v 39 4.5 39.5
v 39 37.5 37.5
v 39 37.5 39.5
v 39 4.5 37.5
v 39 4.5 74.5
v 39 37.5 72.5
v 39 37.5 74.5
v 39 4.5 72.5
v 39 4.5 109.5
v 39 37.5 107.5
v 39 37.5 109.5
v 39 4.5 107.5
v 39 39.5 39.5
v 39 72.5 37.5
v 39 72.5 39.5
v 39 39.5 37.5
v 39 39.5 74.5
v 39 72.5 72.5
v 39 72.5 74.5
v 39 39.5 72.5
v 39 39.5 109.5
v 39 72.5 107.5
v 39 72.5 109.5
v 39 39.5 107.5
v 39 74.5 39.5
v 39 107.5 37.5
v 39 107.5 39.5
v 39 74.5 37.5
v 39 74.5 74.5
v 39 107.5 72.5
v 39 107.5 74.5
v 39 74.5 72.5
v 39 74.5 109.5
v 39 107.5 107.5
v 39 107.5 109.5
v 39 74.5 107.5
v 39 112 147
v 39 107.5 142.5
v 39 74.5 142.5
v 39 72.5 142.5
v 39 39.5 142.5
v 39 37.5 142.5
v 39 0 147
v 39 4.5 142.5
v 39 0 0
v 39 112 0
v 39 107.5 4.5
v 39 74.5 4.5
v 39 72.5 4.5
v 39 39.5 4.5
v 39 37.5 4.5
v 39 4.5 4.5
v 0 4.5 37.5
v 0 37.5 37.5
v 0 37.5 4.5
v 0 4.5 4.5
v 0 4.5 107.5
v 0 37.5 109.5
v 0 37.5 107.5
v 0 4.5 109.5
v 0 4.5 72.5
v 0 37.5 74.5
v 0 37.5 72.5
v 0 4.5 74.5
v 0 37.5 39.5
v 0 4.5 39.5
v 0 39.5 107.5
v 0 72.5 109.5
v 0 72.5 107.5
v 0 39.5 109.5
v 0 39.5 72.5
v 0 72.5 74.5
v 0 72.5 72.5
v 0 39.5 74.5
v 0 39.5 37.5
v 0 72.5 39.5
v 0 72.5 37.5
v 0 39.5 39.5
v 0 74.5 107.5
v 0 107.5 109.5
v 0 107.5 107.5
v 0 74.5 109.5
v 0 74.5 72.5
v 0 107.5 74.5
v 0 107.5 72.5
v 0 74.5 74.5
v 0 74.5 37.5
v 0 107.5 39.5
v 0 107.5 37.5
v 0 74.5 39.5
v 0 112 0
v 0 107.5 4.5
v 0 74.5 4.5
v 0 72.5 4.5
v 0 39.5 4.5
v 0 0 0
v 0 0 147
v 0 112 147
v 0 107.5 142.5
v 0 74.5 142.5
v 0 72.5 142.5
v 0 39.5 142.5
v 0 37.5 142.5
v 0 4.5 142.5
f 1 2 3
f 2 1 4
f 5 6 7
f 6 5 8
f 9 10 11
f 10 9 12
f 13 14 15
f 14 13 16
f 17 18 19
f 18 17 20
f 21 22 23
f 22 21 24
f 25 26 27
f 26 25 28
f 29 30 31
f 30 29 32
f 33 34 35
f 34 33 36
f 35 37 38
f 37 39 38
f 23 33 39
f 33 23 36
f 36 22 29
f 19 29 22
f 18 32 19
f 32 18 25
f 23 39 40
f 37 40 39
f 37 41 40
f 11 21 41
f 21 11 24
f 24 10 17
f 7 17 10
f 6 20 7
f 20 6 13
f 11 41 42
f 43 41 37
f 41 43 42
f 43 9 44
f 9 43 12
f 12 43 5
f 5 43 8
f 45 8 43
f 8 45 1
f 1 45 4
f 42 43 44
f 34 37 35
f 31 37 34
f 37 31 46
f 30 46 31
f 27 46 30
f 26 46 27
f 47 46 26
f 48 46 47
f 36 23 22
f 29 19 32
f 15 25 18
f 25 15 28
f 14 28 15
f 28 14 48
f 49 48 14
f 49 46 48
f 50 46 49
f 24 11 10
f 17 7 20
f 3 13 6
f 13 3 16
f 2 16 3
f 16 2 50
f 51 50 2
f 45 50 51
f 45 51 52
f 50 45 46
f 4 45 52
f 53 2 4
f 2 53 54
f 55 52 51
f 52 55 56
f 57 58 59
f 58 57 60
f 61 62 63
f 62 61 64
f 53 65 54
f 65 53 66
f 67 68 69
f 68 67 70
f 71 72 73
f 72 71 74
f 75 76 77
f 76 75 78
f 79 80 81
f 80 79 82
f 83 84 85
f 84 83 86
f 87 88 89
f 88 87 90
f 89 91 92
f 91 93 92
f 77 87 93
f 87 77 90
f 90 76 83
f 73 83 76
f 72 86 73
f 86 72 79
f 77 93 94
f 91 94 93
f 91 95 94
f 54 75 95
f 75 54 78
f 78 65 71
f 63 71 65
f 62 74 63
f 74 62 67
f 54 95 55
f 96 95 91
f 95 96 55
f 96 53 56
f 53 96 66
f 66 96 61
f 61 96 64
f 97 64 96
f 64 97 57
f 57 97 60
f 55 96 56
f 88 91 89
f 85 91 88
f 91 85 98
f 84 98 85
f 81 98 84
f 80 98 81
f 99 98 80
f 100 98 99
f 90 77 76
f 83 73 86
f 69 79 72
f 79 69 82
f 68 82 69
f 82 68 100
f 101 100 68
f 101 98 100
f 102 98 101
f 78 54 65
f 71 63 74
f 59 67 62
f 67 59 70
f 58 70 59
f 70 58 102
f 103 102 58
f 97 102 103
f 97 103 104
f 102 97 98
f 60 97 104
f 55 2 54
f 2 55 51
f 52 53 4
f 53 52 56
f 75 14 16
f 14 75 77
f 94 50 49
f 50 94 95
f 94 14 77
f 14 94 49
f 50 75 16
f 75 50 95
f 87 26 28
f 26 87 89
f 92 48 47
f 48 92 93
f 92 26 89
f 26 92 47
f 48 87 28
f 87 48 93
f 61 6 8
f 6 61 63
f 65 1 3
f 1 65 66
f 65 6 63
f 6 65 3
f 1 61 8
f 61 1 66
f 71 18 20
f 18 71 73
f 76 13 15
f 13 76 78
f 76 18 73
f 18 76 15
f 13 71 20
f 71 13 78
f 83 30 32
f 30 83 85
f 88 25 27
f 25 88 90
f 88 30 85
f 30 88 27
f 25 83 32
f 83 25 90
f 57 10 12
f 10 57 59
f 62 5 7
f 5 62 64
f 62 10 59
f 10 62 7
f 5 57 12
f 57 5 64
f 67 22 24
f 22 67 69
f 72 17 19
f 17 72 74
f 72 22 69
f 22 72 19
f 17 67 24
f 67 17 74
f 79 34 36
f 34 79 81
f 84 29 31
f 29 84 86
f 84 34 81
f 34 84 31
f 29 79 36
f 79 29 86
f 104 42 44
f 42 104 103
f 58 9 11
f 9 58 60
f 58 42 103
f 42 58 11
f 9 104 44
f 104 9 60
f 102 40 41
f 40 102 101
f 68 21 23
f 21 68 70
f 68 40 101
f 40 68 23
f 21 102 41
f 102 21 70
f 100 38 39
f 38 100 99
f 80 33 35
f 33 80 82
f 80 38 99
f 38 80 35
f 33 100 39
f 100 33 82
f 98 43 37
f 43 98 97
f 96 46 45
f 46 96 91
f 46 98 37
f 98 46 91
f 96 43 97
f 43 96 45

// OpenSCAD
/* [Global] */
// Number of Rows
rows = 4;
// Number of Columns
columns = 3;

/* [Preferences] */
// Width/Height of Box
a = 33;
// Depth of Box
depth = 39;
// Outside Wall Thickness
wall_outer = 4.5;
// Divider Thickness
wall_inner = 2;

difference(){
    cube([depth,columns*a+2*wall_outer+(columns-1)*wall_inner, rows*a+2*wall_outer+(rows-1)*wall_inner],false);
    union() {
        for (y = [a/2+wall_outer:a+wall_inner:rows*a+(rows-1)*wall_inner+wall_outer]){
            for (x = [(a/2)+wall_outer:a+wall_inner:columns*a+(columns-1)*wall_inner+wall_outer]){
                translate([depth/2,x,y]) cube([depth,a,a],true);
            }
        }
    };
};
